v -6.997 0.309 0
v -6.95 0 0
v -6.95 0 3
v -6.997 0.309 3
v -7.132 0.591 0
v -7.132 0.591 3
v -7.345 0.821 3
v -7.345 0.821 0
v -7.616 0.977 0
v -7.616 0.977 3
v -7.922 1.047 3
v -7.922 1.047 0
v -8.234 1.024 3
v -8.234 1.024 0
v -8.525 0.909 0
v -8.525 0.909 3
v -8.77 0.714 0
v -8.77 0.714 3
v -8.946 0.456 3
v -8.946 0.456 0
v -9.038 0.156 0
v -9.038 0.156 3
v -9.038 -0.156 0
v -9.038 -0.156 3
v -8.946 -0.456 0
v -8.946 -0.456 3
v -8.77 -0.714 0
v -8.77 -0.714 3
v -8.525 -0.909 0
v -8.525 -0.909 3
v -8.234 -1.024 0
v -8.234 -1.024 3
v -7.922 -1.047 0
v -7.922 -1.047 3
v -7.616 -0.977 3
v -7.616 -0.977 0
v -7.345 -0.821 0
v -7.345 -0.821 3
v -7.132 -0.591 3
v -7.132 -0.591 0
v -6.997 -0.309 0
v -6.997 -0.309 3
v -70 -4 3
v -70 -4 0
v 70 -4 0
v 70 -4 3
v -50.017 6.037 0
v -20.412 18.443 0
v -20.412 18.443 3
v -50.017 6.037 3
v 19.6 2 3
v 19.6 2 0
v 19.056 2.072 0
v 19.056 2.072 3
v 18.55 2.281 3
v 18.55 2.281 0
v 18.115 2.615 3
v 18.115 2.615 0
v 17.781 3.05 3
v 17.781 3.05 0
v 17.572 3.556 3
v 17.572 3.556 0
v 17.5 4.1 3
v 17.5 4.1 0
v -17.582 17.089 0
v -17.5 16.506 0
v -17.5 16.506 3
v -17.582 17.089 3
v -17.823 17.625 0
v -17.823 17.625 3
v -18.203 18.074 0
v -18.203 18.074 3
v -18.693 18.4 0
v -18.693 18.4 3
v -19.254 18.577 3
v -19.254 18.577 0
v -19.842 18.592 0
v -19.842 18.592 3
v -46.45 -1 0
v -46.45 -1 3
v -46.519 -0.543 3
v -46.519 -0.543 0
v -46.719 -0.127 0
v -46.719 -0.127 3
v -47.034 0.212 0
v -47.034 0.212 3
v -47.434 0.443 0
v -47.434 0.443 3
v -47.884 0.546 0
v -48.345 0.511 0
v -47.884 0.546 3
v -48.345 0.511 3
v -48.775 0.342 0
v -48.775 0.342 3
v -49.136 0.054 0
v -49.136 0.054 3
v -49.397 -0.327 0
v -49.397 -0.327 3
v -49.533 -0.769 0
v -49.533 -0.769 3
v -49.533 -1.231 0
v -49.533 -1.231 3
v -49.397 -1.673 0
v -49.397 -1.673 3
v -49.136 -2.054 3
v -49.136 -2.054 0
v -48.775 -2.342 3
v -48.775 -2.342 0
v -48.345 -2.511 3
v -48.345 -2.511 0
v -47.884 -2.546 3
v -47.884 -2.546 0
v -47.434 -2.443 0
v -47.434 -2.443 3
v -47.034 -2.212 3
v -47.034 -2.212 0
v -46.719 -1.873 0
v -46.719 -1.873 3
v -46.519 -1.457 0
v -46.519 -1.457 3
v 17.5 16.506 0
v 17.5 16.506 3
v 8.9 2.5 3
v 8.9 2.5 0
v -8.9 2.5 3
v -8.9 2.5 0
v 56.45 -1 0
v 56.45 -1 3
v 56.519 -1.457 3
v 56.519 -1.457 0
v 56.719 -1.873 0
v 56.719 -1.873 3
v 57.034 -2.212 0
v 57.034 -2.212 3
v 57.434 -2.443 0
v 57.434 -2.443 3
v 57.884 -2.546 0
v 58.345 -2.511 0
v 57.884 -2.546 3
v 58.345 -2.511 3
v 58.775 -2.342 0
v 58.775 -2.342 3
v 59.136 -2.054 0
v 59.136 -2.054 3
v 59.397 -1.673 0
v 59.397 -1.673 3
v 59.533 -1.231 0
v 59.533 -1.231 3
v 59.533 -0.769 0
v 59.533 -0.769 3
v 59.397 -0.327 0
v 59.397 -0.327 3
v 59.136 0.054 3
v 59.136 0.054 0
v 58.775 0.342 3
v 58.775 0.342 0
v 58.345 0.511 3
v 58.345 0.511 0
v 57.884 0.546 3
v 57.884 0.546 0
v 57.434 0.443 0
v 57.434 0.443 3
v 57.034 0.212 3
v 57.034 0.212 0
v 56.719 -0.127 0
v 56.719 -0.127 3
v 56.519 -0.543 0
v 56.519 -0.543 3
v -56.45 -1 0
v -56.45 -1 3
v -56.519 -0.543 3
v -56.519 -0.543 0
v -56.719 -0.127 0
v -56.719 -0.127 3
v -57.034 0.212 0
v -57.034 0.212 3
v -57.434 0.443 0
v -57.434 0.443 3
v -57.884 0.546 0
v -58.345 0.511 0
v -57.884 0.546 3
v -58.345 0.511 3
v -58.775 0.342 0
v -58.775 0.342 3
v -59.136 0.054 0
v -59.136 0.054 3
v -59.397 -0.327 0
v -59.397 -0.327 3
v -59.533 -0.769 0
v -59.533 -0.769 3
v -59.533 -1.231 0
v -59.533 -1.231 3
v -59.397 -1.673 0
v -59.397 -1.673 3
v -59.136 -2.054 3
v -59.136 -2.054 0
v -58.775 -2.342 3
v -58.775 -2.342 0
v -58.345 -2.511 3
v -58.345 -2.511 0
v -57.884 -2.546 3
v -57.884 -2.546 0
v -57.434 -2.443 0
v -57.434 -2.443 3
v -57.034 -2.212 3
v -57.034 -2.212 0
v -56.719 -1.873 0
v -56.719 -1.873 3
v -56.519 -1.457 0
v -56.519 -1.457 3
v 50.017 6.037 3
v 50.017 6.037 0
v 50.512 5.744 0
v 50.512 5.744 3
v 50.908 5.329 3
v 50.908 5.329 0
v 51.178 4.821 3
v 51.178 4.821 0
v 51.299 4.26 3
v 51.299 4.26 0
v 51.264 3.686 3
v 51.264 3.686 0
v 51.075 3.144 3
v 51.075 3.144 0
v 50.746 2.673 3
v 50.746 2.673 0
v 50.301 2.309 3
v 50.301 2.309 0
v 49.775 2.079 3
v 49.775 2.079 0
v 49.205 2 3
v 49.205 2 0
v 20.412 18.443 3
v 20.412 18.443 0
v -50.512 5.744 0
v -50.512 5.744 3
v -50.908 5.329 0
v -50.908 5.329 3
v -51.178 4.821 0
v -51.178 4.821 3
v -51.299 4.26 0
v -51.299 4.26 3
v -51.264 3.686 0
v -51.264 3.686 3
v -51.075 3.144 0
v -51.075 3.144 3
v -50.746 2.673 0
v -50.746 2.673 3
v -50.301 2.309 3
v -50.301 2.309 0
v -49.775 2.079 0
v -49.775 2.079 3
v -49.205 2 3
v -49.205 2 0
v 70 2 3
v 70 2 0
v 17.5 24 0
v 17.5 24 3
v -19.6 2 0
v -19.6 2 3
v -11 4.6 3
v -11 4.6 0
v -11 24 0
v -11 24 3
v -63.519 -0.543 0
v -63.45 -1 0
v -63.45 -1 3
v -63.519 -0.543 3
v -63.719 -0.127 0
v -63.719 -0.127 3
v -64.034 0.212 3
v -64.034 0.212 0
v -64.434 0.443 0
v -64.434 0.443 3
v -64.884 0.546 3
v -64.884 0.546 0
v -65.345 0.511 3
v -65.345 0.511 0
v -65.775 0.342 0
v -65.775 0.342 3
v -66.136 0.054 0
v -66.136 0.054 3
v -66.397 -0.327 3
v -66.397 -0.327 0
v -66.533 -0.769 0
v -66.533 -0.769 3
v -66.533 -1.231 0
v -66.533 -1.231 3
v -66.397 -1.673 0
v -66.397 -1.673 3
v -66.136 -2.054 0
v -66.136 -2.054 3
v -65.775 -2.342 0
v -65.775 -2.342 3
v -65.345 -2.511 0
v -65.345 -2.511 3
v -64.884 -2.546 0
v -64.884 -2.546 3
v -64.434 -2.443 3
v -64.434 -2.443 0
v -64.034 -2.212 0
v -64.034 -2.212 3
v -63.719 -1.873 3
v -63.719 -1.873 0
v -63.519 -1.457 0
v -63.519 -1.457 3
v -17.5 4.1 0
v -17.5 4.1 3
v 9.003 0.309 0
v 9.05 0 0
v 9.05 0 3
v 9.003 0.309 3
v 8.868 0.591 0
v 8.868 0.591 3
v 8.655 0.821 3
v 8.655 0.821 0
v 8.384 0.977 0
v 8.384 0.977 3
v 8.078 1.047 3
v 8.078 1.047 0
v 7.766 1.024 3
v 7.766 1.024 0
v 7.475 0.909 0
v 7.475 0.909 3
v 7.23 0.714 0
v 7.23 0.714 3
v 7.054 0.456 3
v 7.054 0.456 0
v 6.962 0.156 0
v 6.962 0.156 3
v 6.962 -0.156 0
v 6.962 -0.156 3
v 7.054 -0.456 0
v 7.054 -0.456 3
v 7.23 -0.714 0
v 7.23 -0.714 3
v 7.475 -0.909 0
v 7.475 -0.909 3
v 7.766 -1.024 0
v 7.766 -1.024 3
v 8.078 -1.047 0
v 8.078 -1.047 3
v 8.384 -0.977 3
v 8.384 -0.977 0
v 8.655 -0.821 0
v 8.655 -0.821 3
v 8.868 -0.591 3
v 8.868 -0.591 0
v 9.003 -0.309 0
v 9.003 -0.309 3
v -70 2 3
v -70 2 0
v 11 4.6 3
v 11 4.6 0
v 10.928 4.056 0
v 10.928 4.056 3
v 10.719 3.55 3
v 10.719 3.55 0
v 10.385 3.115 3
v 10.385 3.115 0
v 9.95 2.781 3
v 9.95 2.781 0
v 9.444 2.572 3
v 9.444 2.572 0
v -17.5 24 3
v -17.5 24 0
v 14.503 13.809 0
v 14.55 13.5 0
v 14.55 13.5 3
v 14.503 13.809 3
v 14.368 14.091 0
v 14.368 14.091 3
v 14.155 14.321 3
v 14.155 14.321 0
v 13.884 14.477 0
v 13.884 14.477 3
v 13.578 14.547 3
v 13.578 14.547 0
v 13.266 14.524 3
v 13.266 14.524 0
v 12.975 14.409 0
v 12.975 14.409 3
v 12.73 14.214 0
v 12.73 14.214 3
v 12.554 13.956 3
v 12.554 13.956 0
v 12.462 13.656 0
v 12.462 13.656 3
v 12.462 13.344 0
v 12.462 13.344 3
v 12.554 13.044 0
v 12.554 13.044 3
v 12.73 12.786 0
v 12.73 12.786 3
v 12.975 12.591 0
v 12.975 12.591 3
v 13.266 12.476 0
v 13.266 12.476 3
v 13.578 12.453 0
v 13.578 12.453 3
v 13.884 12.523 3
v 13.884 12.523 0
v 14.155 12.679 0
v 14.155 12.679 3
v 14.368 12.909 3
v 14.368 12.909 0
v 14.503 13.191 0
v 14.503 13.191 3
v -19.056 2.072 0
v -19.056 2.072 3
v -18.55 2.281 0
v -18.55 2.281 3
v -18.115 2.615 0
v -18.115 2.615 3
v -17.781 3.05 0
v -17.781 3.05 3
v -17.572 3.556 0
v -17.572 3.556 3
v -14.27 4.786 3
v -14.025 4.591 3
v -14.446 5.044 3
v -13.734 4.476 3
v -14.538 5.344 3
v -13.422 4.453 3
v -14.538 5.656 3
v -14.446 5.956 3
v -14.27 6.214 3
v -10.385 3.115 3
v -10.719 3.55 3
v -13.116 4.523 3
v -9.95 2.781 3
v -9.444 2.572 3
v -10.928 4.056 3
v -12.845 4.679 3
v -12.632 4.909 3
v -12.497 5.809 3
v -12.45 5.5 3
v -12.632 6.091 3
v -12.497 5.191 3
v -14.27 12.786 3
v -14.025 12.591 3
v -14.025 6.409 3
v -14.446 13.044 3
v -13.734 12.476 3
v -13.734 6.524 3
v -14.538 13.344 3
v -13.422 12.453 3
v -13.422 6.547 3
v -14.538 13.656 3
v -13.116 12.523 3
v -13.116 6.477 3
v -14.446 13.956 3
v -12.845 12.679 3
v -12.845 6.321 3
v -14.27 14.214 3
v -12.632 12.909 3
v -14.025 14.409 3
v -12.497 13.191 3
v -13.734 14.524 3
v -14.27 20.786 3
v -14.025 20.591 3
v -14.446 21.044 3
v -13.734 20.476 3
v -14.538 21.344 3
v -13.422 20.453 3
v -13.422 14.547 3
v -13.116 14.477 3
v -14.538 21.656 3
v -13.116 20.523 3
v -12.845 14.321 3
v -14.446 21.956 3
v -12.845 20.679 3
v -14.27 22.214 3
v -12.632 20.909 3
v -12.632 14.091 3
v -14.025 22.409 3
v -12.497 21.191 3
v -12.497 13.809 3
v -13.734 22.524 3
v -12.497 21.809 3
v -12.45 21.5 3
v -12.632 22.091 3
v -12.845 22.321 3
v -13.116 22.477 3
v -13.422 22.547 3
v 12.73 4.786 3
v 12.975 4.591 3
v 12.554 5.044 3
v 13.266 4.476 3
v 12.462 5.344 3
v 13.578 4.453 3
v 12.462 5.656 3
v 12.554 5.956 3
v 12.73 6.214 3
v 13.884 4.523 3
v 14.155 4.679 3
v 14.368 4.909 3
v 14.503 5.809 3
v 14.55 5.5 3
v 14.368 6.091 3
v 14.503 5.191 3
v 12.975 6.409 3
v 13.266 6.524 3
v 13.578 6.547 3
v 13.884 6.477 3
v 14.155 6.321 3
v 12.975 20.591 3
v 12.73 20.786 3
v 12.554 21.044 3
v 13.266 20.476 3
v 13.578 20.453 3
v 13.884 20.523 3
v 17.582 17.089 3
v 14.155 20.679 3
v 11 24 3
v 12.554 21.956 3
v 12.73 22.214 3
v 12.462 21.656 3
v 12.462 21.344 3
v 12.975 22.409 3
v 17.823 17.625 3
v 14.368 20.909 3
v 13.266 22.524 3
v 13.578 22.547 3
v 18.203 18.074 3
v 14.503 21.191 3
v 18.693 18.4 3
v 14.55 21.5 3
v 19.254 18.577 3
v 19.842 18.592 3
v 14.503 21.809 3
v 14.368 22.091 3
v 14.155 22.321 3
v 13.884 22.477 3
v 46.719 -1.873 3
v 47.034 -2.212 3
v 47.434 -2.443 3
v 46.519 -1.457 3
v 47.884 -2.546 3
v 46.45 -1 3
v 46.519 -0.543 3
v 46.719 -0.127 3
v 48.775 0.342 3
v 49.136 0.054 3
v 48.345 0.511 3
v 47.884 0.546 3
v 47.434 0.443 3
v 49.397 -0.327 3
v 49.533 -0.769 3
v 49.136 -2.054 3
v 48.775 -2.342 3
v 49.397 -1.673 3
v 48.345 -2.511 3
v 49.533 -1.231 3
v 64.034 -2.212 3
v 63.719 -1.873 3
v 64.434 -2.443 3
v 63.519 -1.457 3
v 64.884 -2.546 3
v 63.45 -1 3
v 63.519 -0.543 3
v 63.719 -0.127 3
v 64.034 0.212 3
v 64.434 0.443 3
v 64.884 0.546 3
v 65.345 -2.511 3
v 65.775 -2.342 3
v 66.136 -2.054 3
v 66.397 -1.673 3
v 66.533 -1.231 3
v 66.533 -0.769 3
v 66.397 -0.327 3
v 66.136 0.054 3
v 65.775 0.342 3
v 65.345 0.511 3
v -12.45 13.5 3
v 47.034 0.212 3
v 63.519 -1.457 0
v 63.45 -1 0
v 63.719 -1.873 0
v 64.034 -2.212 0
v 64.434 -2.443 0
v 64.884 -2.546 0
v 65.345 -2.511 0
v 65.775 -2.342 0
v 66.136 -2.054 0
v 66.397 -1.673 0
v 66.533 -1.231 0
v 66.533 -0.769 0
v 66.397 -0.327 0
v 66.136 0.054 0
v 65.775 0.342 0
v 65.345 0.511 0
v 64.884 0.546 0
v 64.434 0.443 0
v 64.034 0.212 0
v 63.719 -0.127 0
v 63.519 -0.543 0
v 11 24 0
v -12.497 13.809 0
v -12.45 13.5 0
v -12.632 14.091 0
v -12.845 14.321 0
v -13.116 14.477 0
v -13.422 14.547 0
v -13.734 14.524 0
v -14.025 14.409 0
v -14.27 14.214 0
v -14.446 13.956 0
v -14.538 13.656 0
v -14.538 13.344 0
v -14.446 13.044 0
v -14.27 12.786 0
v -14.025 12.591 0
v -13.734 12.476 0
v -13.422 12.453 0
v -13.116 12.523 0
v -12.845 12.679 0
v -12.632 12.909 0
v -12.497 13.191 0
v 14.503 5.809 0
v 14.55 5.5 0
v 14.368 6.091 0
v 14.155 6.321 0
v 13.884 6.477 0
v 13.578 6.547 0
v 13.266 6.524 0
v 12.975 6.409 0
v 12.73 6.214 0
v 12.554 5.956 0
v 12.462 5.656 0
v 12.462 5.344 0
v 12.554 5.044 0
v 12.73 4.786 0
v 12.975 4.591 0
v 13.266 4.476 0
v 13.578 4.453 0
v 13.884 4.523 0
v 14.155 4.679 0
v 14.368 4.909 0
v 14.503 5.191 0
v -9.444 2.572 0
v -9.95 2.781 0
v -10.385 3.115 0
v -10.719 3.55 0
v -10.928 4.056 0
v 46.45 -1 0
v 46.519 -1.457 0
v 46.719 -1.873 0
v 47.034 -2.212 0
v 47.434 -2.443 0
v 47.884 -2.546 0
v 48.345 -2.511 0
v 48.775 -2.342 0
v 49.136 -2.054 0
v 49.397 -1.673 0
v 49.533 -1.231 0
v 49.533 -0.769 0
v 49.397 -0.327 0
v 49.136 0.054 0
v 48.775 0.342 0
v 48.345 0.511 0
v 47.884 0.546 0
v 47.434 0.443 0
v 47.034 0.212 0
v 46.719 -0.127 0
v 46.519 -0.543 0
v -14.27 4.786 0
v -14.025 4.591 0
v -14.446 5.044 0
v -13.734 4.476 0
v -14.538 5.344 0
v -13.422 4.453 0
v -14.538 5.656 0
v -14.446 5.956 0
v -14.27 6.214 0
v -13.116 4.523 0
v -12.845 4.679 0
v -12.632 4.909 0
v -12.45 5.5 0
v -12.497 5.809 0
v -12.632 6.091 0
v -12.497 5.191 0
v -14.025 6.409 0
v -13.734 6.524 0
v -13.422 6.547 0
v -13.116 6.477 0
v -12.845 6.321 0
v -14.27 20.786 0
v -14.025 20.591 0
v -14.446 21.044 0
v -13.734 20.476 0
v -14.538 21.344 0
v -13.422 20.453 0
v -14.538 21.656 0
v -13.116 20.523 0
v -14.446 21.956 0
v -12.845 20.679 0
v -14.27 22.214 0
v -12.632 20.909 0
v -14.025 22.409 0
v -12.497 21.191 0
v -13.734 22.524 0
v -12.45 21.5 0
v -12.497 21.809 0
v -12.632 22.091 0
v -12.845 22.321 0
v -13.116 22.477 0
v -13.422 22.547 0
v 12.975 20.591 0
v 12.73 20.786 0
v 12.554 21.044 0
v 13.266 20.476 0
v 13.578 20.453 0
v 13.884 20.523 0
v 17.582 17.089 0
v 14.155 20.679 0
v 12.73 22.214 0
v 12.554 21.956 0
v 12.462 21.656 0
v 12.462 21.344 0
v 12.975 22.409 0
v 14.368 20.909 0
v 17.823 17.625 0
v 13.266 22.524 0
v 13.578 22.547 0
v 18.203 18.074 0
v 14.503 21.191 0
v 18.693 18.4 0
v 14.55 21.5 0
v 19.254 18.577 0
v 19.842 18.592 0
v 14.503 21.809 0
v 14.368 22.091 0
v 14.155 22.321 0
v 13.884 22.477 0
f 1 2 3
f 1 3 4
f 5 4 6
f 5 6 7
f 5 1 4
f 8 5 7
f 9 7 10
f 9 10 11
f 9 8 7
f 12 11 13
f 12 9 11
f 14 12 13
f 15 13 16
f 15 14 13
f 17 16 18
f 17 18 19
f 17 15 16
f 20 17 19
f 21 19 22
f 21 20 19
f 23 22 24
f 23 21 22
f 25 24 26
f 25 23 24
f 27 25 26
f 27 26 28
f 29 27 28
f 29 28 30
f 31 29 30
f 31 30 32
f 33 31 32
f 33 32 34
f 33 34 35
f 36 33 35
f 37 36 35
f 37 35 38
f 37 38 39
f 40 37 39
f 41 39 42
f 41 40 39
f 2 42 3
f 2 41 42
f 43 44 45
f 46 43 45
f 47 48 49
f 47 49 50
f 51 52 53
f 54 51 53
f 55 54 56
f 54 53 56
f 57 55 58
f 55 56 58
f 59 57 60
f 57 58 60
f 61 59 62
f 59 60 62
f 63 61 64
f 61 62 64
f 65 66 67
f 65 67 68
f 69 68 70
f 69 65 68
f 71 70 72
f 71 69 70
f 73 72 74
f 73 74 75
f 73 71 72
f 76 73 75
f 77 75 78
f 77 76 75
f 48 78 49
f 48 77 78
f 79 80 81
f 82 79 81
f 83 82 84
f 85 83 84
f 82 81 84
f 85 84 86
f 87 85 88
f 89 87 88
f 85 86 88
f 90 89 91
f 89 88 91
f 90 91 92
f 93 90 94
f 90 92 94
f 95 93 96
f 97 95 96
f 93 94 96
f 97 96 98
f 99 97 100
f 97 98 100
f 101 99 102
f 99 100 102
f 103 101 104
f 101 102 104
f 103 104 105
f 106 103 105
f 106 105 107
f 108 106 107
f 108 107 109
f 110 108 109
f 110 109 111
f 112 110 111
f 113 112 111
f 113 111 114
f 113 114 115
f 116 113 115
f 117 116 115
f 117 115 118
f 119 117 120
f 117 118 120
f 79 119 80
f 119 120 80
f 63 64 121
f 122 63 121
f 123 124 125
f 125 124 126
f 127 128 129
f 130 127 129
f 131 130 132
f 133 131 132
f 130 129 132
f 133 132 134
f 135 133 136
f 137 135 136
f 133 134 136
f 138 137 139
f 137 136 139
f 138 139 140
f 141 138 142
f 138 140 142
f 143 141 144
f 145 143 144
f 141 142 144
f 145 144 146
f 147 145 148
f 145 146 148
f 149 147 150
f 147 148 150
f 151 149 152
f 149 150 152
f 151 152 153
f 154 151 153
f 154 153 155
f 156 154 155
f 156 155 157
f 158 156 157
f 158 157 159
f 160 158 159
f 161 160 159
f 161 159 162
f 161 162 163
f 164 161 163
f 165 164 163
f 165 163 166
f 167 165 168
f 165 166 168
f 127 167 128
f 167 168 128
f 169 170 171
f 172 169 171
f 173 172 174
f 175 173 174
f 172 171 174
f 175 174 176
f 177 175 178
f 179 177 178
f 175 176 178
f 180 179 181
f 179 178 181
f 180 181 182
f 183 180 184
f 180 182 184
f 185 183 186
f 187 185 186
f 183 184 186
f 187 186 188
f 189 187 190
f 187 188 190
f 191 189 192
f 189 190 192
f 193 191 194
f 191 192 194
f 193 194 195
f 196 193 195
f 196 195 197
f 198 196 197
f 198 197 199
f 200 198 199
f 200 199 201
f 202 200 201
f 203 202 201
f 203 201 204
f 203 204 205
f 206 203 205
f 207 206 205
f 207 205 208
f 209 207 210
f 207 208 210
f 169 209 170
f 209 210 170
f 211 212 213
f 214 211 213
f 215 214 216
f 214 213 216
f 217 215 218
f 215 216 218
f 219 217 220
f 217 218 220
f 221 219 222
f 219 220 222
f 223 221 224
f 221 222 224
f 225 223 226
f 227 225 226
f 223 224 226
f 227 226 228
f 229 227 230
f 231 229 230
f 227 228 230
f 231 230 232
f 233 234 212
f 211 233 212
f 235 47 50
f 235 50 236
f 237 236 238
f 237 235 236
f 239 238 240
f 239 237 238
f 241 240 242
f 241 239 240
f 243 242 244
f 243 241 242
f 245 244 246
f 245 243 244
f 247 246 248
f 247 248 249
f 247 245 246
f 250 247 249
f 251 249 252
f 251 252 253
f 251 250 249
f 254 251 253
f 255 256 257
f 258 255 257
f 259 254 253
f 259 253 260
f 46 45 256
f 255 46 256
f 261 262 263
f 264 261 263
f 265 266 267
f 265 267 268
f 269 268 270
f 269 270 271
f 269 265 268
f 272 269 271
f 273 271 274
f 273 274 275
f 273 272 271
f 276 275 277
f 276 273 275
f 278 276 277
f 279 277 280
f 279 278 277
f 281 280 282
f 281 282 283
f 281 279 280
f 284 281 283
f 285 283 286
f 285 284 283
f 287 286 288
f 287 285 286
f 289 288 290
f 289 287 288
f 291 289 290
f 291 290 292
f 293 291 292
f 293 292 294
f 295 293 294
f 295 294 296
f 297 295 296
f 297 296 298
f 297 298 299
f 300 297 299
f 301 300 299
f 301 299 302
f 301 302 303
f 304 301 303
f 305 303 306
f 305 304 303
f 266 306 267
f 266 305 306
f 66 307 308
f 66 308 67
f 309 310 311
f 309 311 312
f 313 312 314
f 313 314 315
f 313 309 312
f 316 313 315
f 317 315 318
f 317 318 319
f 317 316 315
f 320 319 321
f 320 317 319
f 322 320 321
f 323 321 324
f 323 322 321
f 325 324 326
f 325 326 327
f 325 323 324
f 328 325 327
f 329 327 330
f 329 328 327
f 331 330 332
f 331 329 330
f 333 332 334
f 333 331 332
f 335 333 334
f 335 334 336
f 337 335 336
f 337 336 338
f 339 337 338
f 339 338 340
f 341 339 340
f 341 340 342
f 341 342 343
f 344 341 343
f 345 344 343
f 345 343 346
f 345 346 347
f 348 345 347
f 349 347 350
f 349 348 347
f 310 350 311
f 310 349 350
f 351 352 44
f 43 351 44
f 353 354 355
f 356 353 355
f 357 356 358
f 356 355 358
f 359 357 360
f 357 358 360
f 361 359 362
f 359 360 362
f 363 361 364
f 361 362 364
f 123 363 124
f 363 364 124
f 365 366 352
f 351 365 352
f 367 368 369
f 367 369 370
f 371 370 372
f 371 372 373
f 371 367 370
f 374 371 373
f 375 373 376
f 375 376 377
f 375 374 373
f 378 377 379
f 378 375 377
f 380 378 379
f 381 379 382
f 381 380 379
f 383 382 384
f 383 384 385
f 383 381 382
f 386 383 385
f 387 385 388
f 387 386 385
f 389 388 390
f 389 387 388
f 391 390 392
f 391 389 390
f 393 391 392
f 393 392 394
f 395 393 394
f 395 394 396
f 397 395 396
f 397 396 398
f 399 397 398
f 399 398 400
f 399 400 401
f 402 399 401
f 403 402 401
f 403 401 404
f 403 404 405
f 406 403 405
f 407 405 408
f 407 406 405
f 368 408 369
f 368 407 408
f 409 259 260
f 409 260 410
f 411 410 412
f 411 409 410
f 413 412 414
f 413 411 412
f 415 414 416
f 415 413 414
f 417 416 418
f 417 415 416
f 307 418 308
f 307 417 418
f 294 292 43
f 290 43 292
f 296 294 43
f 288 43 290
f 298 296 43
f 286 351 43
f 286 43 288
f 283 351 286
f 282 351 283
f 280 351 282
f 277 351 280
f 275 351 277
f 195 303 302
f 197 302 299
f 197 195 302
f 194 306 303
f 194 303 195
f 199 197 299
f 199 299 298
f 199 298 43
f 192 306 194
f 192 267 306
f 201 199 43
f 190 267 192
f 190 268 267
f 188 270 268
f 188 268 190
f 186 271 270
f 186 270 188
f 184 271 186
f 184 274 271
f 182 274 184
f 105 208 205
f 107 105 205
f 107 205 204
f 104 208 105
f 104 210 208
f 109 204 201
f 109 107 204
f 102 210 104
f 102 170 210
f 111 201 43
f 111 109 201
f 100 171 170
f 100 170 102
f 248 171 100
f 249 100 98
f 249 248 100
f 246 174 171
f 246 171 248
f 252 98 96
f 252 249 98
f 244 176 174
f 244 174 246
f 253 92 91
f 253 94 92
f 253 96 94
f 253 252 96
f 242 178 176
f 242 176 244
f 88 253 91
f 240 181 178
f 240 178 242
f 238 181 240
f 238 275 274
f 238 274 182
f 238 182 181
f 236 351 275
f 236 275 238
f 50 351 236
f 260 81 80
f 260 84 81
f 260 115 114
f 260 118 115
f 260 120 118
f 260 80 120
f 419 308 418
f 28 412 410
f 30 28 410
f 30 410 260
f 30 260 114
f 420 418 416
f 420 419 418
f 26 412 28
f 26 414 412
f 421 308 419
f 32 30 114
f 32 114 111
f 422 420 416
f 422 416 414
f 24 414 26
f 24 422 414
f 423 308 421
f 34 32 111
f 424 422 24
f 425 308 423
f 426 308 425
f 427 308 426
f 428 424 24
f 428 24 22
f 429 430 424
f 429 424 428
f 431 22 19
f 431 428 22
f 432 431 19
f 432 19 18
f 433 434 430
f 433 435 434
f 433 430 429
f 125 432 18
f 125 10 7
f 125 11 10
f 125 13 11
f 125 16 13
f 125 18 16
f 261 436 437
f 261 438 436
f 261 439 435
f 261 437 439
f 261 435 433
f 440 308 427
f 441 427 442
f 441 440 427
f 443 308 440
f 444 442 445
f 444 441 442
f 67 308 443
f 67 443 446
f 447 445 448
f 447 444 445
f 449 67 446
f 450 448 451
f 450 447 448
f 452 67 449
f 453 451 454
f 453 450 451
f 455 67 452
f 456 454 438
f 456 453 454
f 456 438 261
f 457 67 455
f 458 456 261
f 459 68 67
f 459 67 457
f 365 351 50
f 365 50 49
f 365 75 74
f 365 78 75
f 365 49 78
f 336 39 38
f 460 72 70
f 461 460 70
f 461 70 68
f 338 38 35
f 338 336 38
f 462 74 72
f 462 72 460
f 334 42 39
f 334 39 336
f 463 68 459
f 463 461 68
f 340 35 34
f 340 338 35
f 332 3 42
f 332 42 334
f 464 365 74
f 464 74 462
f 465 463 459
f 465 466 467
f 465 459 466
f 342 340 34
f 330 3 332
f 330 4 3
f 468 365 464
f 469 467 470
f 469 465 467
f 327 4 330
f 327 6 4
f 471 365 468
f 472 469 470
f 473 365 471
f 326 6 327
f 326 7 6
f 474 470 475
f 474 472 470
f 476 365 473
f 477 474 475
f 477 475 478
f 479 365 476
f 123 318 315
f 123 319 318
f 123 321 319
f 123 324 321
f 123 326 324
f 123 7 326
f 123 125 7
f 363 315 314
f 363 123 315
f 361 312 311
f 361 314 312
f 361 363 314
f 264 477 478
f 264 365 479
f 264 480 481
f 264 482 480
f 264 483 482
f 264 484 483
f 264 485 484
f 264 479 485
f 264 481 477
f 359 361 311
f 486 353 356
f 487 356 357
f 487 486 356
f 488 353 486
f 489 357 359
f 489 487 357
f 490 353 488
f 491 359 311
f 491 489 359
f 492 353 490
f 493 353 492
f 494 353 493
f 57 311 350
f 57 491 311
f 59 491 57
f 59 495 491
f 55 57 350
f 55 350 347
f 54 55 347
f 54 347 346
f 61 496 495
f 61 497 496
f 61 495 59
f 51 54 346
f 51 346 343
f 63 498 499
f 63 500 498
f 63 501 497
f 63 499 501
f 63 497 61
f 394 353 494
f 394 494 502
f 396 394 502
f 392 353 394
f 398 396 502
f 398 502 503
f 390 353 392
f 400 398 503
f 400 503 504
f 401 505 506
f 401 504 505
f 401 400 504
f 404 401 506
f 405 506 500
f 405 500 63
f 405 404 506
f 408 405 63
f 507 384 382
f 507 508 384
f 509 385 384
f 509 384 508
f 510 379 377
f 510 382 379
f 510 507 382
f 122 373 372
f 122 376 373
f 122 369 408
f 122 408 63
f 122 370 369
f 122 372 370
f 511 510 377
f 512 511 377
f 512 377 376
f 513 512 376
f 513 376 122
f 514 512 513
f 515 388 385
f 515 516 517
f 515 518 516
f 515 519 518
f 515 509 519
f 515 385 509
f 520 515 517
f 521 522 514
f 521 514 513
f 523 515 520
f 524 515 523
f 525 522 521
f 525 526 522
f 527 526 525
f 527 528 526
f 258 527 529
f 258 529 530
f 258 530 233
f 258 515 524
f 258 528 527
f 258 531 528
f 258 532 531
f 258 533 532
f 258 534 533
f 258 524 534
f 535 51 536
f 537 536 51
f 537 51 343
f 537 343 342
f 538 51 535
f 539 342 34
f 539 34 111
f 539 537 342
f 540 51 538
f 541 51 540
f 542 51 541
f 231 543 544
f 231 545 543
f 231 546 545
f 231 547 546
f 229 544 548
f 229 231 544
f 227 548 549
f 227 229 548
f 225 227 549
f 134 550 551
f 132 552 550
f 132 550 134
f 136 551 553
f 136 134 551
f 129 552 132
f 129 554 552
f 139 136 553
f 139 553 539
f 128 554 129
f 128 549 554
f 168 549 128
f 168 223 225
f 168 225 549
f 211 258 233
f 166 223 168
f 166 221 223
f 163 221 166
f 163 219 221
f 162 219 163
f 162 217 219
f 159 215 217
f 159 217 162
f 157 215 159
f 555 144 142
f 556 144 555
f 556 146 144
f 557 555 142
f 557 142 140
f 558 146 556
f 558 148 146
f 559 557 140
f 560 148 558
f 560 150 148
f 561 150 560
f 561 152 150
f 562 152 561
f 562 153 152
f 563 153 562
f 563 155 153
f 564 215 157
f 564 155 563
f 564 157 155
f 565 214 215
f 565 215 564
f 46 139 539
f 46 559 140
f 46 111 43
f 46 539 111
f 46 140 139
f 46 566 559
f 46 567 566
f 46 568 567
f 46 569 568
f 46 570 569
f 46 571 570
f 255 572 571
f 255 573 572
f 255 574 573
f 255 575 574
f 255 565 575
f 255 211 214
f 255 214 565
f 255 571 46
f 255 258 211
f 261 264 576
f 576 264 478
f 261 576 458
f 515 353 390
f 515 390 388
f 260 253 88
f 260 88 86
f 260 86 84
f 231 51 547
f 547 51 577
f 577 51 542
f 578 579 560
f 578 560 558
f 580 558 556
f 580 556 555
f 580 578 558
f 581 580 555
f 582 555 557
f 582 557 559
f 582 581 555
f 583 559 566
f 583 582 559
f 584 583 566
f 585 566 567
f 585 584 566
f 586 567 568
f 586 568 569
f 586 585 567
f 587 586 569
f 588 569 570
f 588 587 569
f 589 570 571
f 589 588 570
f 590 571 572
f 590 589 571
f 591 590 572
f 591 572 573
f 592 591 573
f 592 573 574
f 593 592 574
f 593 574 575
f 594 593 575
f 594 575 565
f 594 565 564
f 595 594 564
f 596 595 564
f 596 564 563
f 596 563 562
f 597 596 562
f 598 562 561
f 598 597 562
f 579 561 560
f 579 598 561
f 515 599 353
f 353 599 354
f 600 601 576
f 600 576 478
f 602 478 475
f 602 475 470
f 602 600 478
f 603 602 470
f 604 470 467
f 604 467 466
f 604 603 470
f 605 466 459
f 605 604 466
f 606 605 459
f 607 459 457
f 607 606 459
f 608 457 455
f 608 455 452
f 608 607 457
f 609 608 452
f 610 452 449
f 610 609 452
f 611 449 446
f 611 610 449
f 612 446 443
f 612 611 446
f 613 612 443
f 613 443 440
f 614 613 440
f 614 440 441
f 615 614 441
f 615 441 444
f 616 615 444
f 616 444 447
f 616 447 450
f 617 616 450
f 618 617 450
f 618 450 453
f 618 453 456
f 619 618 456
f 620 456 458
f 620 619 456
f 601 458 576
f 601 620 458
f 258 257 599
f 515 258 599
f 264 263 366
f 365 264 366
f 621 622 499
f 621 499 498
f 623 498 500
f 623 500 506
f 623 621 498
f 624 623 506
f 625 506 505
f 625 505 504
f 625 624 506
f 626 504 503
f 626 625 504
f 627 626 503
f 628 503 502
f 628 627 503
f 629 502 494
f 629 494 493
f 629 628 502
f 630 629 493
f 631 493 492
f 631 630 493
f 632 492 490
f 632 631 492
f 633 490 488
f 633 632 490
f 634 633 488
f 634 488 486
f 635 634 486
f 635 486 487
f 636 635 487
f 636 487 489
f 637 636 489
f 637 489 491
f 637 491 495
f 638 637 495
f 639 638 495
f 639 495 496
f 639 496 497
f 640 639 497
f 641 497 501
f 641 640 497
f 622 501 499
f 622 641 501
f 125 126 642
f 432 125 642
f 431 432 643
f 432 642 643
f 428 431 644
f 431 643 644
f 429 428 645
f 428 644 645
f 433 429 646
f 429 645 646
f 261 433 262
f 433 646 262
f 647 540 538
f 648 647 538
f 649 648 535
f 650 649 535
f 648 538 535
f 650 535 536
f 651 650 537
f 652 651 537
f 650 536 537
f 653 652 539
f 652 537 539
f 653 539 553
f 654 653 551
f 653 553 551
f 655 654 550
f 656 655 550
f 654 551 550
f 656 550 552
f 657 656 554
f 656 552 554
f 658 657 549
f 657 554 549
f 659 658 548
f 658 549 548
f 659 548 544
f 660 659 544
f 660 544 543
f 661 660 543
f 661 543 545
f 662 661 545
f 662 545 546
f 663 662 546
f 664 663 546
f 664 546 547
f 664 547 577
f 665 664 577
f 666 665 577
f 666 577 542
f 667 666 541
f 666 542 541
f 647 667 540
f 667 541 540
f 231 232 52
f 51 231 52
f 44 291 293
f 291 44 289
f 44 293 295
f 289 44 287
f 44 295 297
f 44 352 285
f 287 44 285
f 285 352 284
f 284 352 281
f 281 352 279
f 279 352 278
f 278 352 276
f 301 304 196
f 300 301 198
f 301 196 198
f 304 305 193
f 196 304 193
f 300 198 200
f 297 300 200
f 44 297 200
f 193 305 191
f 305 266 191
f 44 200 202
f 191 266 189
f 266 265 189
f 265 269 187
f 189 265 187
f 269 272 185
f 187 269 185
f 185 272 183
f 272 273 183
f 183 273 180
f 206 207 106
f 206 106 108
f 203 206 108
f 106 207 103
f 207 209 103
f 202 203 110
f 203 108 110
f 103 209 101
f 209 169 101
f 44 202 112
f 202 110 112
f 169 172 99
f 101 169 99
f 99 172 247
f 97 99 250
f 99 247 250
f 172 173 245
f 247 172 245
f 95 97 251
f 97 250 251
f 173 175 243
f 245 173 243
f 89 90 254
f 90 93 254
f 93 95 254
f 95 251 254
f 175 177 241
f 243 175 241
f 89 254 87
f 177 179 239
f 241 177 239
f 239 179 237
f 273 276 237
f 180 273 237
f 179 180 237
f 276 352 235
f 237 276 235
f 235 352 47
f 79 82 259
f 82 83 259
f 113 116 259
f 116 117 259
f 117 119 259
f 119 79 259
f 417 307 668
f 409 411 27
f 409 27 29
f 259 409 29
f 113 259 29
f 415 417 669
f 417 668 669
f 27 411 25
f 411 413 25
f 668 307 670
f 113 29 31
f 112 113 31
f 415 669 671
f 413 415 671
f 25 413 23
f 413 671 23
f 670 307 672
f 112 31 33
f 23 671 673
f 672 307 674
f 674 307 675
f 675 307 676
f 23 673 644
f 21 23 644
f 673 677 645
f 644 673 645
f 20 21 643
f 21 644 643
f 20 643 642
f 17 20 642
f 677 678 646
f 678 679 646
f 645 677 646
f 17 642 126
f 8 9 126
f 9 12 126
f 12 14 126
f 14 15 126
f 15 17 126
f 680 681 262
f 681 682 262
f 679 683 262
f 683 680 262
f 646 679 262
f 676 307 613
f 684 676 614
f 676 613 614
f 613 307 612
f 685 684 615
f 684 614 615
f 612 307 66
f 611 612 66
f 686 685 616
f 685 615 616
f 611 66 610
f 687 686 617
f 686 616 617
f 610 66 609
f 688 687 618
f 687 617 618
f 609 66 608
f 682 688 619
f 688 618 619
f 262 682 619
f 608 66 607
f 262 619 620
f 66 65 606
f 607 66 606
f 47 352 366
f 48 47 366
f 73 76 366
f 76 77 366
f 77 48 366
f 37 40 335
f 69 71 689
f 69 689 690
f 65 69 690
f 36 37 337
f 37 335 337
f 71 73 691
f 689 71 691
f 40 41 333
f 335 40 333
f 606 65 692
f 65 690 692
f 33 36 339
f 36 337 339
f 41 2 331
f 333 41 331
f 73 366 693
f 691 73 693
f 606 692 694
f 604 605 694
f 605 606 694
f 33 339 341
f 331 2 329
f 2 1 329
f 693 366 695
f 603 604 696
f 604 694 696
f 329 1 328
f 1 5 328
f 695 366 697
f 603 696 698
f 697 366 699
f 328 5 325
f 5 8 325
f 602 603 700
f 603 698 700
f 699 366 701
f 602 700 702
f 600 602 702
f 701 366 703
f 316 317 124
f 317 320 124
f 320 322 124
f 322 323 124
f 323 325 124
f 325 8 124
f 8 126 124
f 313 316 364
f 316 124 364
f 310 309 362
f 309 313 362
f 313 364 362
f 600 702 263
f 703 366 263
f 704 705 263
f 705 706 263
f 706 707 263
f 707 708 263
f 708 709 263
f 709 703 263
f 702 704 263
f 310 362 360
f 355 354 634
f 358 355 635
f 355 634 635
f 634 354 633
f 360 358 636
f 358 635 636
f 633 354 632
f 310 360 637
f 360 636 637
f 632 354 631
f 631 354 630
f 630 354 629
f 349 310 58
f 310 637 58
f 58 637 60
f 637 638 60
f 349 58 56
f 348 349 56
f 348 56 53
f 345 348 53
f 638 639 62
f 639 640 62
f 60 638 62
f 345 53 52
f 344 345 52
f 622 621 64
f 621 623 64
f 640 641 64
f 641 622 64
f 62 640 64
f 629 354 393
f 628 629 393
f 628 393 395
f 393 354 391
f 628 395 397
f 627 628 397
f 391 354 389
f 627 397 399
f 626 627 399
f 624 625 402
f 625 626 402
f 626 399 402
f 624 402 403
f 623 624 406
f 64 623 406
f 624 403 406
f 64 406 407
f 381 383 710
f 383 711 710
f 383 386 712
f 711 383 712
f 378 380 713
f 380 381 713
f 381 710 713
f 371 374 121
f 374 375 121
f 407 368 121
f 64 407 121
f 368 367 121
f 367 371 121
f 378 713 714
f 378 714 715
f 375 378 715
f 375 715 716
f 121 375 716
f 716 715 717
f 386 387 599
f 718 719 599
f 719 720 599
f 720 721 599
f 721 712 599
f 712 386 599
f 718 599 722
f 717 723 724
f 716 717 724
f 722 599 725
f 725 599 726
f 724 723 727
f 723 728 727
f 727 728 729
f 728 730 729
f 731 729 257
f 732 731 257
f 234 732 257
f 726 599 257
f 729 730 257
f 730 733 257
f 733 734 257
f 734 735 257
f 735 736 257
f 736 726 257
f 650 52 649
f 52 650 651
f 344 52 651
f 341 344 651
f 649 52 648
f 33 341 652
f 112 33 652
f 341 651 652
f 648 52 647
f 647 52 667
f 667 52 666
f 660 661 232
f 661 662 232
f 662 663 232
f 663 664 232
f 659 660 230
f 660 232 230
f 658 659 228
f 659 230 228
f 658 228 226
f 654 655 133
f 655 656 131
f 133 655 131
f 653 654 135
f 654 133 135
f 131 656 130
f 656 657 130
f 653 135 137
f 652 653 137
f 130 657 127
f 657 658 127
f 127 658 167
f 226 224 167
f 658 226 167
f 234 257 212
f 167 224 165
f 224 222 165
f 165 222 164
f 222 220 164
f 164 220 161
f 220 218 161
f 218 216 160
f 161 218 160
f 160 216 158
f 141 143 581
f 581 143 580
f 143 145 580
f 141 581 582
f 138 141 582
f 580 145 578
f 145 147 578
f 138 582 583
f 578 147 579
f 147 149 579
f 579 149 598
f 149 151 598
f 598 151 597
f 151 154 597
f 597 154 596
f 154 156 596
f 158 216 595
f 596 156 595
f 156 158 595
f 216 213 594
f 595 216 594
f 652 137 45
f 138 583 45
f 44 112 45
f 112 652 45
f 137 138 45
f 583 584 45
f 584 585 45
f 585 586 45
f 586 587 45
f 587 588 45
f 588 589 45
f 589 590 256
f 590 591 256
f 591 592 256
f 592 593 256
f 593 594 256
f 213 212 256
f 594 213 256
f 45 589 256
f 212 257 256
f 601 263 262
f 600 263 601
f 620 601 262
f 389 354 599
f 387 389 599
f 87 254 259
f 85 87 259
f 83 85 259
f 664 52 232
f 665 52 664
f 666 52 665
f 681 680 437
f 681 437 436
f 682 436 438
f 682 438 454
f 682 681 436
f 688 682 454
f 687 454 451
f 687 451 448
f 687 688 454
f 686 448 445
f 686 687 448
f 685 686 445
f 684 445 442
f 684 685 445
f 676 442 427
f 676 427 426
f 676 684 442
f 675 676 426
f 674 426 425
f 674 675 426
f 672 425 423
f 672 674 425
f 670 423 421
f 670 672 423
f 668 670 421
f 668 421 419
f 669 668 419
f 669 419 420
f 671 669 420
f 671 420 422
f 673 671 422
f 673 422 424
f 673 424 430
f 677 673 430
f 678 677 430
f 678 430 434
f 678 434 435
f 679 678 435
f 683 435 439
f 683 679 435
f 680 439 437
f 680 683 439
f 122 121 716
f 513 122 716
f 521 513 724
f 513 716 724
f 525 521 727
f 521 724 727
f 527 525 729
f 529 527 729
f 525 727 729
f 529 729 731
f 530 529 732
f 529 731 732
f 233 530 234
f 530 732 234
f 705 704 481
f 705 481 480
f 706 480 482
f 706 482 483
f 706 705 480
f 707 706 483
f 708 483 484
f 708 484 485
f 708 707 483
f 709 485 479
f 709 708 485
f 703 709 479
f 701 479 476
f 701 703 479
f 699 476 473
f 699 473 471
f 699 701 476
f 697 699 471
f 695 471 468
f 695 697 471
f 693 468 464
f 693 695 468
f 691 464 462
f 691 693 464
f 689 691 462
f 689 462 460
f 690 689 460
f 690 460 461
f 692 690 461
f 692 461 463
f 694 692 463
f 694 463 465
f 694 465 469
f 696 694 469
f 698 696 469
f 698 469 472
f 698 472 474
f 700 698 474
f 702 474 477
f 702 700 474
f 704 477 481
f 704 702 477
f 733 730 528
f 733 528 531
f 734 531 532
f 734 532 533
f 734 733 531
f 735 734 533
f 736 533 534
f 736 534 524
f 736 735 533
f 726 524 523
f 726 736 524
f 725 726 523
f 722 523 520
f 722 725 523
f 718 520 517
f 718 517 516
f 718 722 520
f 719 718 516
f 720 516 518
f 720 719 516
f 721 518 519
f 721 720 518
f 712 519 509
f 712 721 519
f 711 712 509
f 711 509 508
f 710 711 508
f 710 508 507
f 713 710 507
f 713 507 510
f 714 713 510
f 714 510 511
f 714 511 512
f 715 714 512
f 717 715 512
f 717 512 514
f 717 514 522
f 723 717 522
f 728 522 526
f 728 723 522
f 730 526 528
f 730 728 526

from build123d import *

# Parameters (mm, degrees)
SKETCH_1_R          = 1.05
SKETCH_1_R_2        = 1.55
EXTRUDE_1_DEPTH     = 3
SKETCH_2_R          = 1.55
CUT_EXTRUDE_1_DEPTH = 3


with BuildPart() as part:
    # ｽｹｯﾁ1 → ﾎﾞｽ - 押し出し1 (new body)
    with BuildSketch(Plane.XY):
        with BuildLine():
            Line((-11, 4.6), (-11, 24))
            Line((-11, 24), (-17.5, 24))
            Line((-17.5, 24), (-70, 2))
            Line((-70, 2), (-70, -4))
            Line((-70, -4), (-17.5, -4))
            Line((-17.5, -4), (17.5, -4))
            Line((17.5, -4), (70, -4))
            Line((70, -4), (70, 2))
            Line((70, 2), (17.5, 24))
            Line((17.5, 24), (11, 24))
            Line((11, 24), (11, 4.6))
            ThreePointArc((11, 4.6), (10.38492424, 3.11507576), (8.9, 2.5))
            Line((8.9, 2.5), (-8.9, 2.5))
            ThreePointArc((-8.9, 2.5), (-10.38492424, 3.11507576), (-11, 4.6))
        make_face()
        with Locations((-13.5, 5.5)):
            Circle(SKETCH_1_R, mode=Mode.SUBTRACT)
        with Locations((-8, 0)):
            Circle(SKETCH_1_R, mode=Mode.SUBTRACT)
        with Locations((8, 0)):
            Circle(SKETCH_1_R, mode=Mode.SUBTRACT)
        with Locations((-13.5, 13.5)):
            Circle(SKETCH_1_R, mode=Mode.SUBTRACT)
        with Locations((-13.5, 21.5)):
            Circle(SKETCH_1_R, mode=Mode.SUBTRACT)
        with Locations((13.5, 21.5)):
            Circle(SKETCH_1_R, mode=Mode.SUBTRACT)
        with Locations((13.5, 13.5)):
            Circle(SKETCH_1_R, mode=Mode.SUBTRACT)
        with Locations((13.5, 5.5)):
            Circle(SKETCH_1_R, mode=Mode.SUBTRACT)
        with Locations((-65, -1)):
            Circle(SKETCH_1_R_2, mode=Mode.SUBTRACT)
        with Locations(Location((65, -1, 0), (0, 0, 180))):
            Circle(SKETCH_1_R_2, mode=Mode.SUBTRACT)
        with BuildLine():
            Line((-17.5, 4.1), (-17.5, 16.506066998))
            ThreePointArc((-17.5, 16.506066998), (-18.436901101, 18.254552329), (-20.411619954, 18.442887344))
            Line((-20.411619954, 18.442887344), (-50.017007109, 6.036820345))
            ThreePointArc((-50.017007109, 6.036820345), (-51.264188108, 3.686069284), (-49.205387155, 2))
            Line((-49.205387155, 2), (-19.6, 2))
            ThreePointArc((-19.6, 2), (-18.11507576, 2.61507576), (-17.5, 4.1))
        make_face(mode=Mode.SUBTRACT)
        with BuildLine():
            Line((20.411619954, 18.442887344), (50.017007109, 6.036820345))
            ThreePointArc((50.017007109, 6.036820345), (51.264188108, 3.686069284), (49.205387155, 2))
            Line((49.205387155, 2), (19.6, 2))
            ThreePointArc((19.6, 2), (18.11507576, 2.61507576), (17.5, 4.1))
            Line((17.5, 4.1), (17.5, 16.506066998))
            ThreePointArc((17.5, 16.506066998), (18.436901101, 18.254552329), (20.411619954, 18.442887344))
        make_face(mode=Mode.SUBTRACT)
    extrude(amount=EXTRUDE_1_DEPTH)

    # ｽｹｯﾁ2 → ｶｯﾄ - 押し出し1 (cut)
    with BuildSketch(Plane.XY.offset(3)):
        with Locations((-48, -1)):
            Circle(SKETCH_2_R)
        with Locations(Location((48, -1, 0), (0, 0, 180))):
            Circle(SKETCH_2_R)
        with Locations((-58, -1)):
            Circle(SKETCH_2_R)
        with Locations(Location((58, -1, 0), (0, 0, 180))):
            Circle(SKETCH_2_R)
    extrude(amount=-CUT_EXTRUDE_1_DEPTH, mode=Mode.SUBTRACT)


solid = part.part
